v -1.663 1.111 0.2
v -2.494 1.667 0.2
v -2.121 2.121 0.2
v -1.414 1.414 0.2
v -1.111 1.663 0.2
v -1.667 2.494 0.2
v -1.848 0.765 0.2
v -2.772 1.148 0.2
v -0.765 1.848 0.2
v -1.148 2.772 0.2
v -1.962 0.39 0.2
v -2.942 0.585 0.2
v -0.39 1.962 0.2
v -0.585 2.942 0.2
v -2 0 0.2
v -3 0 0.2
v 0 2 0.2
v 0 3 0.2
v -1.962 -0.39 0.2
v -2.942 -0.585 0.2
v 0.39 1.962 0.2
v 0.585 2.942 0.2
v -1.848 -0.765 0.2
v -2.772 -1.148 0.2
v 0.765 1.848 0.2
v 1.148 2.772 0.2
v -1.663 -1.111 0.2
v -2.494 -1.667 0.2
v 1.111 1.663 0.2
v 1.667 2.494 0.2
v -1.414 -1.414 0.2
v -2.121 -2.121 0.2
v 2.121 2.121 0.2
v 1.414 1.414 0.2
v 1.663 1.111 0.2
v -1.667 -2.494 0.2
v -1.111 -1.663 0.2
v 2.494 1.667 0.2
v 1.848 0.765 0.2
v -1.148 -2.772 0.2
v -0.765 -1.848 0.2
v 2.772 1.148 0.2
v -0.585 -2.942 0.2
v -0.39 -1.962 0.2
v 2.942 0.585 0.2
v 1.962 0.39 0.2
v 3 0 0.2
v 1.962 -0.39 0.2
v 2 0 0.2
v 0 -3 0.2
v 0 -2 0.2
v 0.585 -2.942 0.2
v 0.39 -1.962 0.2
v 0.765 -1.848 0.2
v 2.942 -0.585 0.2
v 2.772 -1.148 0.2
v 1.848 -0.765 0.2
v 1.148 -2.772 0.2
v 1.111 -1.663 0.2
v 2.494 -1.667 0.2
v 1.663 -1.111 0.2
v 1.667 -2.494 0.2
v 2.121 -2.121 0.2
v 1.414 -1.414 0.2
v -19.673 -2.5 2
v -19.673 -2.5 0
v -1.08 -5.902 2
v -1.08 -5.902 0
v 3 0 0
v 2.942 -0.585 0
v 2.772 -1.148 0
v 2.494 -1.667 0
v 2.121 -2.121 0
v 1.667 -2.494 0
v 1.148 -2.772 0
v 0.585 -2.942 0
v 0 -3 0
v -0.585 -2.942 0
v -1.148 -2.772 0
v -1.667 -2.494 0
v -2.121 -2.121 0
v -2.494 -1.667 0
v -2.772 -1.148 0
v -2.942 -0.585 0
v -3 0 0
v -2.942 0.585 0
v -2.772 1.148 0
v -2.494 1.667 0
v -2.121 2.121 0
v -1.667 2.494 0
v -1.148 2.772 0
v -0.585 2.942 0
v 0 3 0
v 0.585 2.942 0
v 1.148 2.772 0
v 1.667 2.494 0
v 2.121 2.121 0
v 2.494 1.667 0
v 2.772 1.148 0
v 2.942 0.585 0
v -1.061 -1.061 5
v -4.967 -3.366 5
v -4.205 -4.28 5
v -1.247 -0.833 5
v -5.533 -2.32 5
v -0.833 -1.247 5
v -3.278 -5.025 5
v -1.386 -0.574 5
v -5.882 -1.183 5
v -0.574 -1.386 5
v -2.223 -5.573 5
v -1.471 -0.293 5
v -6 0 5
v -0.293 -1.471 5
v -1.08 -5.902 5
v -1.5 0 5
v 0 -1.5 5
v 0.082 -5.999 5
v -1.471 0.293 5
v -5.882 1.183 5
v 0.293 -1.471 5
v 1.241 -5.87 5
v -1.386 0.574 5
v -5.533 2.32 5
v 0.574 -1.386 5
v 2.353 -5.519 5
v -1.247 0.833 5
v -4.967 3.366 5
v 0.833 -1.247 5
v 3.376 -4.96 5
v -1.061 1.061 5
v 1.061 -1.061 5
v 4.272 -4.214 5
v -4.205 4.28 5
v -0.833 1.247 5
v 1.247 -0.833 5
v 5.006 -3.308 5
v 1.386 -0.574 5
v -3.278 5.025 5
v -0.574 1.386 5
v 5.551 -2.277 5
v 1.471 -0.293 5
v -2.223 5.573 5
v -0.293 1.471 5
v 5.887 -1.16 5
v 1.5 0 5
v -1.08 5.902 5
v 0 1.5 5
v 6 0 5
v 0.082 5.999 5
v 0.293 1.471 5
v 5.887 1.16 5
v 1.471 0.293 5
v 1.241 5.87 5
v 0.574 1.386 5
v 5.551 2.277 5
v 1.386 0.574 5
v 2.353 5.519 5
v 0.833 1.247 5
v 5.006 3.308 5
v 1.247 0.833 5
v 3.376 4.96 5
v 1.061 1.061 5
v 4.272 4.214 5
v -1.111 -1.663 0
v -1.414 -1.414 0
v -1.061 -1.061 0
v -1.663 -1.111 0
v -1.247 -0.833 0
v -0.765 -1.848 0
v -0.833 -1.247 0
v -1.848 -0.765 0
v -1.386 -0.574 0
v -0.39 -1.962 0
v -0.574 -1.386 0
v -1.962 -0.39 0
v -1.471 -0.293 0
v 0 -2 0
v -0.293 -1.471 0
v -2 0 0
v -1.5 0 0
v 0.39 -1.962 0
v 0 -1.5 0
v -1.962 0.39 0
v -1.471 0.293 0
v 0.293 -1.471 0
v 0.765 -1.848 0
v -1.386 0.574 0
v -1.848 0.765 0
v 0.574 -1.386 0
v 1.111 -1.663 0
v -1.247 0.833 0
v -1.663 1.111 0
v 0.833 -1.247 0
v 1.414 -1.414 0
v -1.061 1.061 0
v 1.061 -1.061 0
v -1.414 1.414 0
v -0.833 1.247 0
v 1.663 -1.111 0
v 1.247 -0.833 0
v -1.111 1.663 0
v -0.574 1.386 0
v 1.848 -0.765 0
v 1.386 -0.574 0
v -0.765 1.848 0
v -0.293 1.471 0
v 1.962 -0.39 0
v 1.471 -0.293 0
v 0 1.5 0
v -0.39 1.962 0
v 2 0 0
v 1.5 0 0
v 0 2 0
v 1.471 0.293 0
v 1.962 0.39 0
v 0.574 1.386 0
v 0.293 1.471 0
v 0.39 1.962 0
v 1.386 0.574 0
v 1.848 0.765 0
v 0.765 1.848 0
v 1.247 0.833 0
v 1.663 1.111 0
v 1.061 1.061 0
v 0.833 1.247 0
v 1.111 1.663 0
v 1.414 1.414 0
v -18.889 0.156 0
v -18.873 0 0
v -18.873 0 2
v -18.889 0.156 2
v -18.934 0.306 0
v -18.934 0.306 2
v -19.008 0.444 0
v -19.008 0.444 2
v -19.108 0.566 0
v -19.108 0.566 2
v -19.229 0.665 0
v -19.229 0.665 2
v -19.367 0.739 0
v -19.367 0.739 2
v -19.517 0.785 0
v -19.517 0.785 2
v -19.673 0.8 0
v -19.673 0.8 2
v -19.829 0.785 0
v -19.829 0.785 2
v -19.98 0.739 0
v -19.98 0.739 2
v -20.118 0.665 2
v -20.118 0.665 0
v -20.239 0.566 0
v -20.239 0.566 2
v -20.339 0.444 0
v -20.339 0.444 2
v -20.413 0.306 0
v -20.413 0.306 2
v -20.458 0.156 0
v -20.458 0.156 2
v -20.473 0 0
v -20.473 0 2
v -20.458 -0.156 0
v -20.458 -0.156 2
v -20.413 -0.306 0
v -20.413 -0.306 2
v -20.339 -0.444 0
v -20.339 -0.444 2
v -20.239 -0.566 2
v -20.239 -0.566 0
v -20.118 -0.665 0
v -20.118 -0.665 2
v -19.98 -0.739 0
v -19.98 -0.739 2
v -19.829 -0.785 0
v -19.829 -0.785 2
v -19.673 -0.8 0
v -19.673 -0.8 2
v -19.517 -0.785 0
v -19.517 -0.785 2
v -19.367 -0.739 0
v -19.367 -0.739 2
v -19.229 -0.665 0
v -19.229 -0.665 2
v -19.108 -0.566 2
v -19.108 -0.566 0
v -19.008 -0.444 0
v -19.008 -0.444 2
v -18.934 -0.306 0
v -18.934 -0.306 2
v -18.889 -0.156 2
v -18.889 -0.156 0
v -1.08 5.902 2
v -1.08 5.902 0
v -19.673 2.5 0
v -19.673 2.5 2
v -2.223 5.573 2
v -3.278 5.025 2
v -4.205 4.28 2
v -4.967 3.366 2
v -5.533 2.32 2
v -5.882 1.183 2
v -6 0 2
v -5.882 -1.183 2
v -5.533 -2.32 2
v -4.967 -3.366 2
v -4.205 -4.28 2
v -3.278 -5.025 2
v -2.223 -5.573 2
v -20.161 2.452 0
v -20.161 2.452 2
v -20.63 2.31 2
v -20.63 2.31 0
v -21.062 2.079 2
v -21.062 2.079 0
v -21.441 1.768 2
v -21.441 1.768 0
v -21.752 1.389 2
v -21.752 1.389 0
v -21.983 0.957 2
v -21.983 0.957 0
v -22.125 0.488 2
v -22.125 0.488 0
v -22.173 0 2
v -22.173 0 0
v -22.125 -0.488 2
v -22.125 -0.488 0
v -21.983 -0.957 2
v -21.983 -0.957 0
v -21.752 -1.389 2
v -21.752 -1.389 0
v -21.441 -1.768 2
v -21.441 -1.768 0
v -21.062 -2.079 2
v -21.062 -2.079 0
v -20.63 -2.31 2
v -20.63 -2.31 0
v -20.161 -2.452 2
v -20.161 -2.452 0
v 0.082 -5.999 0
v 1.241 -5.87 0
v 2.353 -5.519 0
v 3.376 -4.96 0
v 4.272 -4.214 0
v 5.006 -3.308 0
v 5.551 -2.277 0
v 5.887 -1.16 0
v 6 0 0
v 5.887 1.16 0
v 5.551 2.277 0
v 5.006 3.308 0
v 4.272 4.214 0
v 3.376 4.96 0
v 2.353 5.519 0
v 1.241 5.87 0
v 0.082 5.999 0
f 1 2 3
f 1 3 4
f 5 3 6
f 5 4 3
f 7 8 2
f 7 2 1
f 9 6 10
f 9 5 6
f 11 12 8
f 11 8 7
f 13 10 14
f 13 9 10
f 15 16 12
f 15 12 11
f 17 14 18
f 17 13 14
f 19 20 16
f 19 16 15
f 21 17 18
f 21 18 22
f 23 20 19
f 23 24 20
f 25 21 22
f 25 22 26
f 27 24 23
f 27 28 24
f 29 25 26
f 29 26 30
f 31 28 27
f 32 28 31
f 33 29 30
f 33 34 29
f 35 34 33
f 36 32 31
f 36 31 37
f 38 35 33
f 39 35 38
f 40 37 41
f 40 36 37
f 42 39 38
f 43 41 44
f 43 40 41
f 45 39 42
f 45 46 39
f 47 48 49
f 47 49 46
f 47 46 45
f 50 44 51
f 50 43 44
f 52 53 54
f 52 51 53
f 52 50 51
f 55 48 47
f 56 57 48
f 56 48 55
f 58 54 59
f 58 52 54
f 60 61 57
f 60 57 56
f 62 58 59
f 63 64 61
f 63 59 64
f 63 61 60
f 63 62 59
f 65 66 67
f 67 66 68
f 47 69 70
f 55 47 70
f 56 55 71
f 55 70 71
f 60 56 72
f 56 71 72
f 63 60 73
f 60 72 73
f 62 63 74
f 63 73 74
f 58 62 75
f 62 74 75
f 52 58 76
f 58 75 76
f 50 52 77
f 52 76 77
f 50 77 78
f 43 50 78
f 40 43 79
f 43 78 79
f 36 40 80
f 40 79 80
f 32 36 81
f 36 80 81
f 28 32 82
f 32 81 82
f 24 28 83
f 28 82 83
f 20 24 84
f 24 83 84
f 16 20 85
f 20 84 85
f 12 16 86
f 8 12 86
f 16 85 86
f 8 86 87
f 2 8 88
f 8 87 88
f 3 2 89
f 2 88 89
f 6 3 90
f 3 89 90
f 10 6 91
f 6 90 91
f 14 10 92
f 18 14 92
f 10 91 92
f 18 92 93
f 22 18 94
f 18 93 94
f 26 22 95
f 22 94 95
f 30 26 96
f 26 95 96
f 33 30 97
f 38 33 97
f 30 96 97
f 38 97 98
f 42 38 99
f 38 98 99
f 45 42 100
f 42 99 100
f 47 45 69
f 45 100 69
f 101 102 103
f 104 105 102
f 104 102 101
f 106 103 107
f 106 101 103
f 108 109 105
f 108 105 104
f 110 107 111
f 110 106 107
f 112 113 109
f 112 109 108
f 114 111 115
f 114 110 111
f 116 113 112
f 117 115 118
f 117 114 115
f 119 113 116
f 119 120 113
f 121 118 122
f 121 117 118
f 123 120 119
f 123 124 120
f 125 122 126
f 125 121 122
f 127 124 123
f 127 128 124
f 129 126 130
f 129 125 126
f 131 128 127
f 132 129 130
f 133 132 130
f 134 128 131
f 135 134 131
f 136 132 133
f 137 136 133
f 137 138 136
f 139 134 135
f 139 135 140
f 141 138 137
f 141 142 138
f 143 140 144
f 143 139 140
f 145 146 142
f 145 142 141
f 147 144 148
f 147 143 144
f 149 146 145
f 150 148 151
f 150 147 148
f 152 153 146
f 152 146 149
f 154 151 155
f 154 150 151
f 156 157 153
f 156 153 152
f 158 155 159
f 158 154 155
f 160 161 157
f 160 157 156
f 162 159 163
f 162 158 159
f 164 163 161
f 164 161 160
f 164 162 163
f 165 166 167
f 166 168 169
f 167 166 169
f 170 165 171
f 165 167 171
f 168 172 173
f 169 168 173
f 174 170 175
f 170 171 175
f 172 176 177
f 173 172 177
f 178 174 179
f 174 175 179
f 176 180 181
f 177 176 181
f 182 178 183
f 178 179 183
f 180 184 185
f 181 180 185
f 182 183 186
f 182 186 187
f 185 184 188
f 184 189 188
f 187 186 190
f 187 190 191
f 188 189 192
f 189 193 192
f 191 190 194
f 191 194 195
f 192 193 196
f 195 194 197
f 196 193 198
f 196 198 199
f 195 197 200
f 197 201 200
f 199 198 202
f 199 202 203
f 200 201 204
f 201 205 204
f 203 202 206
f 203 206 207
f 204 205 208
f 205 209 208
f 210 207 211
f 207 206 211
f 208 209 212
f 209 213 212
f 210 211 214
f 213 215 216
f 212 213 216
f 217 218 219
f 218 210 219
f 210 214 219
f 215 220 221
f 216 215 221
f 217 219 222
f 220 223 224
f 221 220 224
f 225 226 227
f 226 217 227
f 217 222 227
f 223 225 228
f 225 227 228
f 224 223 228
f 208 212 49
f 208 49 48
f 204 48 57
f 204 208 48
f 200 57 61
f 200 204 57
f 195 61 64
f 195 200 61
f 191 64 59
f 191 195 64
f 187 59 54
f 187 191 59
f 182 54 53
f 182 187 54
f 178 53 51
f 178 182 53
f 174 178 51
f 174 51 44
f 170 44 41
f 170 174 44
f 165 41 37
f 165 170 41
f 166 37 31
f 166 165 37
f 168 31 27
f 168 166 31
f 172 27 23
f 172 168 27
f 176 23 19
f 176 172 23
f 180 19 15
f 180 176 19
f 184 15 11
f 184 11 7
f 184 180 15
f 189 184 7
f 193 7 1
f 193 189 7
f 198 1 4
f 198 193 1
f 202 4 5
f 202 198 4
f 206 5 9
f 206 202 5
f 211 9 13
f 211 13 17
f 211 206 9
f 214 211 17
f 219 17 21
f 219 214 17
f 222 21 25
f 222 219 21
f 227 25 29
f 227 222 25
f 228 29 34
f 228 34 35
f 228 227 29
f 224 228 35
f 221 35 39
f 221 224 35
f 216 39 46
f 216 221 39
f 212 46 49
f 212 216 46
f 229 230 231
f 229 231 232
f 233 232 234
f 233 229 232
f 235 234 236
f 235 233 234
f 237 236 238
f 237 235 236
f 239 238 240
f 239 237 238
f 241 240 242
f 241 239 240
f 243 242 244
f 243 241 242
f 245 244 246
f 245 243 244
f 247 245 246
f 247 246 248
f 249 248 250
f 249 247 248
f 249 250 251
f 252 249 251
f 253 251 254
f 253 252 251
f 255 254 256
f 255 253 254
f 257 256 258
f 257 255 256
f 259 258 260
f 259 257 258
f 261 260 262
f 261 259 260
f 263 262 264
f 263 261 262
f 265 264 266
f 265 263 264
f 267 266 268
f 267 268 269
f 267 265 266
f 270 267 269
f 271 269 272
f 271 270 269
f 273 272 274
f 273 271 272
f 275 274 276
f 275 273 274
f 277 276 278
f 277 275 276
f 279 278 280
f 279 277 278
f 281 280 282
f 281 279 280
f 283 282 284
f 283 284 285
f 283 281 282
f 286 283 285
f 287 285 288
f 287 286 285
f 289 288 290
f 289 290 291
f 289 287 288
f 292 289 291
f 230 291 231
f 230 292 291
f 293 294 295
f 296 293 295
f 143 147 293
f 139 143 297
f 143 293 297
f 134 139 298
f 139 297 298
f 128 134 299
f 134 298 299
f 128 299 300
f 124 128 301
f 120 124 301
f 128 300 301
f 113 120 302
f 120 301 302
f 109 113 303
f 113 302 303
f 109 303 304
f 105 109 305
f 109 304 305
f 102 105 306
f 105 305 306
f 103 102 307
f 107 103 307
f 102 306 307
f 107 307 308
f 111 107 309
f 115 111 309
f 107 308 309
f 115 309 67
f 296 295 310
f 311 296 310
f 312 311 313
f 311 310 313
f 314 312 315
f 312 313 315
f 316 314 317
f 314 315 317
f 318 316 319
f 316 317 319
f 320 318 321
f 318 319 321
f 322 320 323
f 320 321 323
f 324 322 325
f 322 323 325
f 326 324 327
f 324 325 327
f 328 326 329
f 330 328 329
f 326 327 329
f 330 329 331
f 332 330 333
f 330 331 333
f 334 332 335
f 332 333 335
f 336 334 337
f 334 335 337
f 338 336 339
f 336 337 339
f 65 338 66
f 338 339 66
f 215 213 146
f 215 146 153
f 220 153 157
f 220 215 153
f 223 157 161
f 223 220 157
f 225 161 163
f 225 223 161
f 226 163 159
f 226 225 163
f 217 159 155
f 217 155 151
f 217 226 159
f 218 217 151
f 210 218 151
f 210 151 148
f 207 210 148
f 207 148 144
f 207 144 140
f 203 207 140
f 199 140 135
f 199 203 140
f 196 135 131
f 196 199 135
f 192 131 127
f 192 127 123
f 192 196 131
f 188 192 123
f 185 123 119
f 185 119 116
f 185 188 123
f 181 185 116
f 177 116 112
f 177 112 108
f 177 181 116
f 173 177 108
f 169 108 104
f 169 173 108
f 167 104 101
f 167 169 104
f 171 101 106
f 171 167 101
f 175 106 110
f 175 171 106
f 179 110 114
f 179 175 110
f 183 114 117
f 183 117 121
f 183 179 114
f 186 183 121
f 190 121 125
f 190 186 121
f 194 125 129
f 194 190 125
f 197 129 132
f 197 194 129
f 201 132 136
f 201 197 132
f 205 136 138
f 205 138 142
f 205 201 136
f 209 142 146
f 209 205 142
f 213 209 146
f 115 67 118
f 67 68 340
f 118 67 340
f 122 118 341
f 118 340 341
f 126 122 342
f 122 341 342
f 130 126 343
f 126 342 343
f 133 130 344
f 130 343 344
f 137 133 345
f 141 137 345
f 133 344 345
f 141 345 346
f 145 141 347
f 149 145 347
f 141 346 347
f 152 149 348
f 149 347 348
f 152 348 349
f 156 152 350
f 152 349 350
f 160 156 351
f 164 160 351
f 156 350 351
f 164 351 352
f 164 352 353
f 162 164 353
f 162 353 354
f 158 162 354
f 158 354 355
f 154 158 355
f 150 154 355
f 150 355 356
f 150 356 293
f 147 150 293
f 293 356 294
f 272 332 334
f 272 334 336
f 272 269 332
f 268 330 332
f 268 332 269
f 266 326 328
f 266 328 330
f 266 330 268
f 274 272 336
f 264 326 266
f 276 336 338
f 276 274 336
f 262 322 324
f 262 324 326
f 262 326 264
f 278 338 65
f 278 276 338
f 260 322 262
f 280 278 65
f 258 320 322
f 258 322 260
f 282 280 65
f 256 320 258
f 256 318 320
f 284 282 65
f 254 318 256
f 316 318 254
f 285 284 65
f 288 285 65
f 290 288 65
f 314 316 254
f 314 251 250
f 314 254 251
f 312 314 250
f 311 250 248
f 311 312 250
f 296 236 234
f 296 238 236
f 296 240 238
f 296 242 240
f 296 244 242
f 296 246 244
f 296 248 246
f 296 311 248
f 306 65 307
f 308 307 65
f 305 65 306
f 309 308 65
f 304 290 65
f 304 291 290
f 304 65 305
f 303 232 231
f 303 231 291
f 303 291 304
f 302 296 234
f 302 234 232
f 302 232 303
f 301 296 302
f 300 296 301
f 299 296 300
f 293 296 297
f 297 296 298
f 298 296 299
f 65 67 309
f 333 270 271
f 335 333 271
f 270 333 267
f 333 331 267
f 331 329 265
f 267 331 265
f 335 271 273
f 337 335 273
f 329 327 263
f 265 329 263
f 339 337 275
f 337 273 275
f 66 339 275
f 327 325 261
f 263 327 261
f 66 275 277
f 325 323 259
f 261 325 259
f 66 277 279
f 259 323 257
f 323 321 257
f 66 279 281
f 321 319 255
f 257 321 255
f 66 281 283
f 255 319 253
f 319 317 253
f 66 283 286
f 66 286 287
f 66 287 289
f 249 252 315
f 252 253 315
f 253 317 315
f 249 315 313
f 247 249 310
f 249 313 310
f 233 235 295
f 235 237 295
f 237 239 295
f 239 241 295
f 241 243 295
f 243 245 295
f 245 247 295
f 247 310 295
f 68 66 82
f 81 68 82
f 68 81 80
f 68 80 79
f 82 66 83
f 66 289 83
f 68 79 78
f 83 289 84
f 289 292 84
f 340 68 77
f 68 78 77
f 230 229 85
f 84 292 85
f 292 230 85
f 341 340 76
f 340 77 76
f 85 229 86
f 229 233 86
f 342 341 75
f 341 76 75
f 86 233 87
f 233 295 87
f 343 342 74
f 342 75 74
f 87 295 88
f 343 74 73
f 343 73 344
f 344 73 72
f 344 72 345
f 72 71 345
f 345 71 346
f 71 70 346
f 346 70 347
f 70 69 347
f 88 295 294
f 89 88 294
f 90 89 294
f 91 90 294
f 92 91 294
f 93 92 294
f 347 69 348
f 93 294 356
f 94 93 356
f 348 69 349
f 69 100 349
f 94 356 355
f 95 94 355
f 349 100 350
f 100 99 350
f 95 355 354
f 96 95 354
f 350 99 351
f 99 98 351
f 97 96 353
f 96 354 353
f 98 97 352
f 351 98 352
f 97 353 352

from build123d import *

# Parameters (mm, degrees)
F0_R     = 1.5
F1_DEPTH = 5
F0_R_2   = 0.8
F2_DEPTH = 2
F3_R     = 3
F3_R_2   = 2
F4_DEPTH = 0.2


with BuildPart() as f1:
    # F0 (on Top) → F1 (new body)
    with BuildSketch(Plane.XY):
        with BuildLine():
            ThreePointArc((-1.0798815668, -5.9020213319), (3.8419207826, -4.6086489018), (6, 0))
            ThreePointArc((6, 0), (3.8419207985, 4.6086488886), (-1.0798815261, 5.9020213393))
            ThreePointArc((-1.0798815261, 5.9020213393), (-6, 2.07e-08), (-1.0798815668, -5.9020213319))
        make_face()
        Circle(F0_R, mode=Mode.SUBTRACT)
    extrude(amount=F1_DEPTH)

    # F0 (on Top) → F2 (join)
    with BuildSketch(Plane.XY):
        with BuildLine():
            ThreePointArc((-1.0798815668, -5.9020213319), (-6, 2.07e-08), (-1.0798815261, 5.9020213393))
            Line((-1.0798815261, 5.9020213393), (-19.6734044441, 2.5))
            ThreePointArc((-19.6734044441, 2.5), (-17.9056374912, 1.767766953), (-17.1734044441, 0))
            ThreePointArc((-17.1734044441, 0), (-17.9056374912, -1.767766953), (-19.6734044441, -2.5))
            Line((-19.6734044441, -2.5), (-1.0798815668, -5.9020213319))
        make_face()
        with BuildLine():
            ThreePointArc((-17.1734044441, 0), (-17.9056374912, 1.767766953), (-19.6734044441, 2.5))
            ThreePointArc((-19.6734044441, 2.5), (-22.1734044441, 0), (-19.6734044441, -2.5))
            ThreePointArc((-19.6734044441, -2.5), (-17.9056374912, -1.767766953), (-17.1734044441, 0))
        make_face()
        with Locations((-19.6734044441, 0)):
            Circle(F0_R_2, mode=Mode.SUBTRACT)
    extrude(amount=F2_DEPTH)

    # F3 (on face) → F4 (cut)
    with BuildSketch(Plane(origin=(0, 0, 0), x_dir=(1, 0, 0), z_dir=(0, 0, -1))):
        Circle(F3_R)
        Circle(F3_R_2, mode=Mode.SUBTRACT)
    extrude(amount=-F4_DEPTH, mode=Mode.SUBTRACT)


solid = f1.part
